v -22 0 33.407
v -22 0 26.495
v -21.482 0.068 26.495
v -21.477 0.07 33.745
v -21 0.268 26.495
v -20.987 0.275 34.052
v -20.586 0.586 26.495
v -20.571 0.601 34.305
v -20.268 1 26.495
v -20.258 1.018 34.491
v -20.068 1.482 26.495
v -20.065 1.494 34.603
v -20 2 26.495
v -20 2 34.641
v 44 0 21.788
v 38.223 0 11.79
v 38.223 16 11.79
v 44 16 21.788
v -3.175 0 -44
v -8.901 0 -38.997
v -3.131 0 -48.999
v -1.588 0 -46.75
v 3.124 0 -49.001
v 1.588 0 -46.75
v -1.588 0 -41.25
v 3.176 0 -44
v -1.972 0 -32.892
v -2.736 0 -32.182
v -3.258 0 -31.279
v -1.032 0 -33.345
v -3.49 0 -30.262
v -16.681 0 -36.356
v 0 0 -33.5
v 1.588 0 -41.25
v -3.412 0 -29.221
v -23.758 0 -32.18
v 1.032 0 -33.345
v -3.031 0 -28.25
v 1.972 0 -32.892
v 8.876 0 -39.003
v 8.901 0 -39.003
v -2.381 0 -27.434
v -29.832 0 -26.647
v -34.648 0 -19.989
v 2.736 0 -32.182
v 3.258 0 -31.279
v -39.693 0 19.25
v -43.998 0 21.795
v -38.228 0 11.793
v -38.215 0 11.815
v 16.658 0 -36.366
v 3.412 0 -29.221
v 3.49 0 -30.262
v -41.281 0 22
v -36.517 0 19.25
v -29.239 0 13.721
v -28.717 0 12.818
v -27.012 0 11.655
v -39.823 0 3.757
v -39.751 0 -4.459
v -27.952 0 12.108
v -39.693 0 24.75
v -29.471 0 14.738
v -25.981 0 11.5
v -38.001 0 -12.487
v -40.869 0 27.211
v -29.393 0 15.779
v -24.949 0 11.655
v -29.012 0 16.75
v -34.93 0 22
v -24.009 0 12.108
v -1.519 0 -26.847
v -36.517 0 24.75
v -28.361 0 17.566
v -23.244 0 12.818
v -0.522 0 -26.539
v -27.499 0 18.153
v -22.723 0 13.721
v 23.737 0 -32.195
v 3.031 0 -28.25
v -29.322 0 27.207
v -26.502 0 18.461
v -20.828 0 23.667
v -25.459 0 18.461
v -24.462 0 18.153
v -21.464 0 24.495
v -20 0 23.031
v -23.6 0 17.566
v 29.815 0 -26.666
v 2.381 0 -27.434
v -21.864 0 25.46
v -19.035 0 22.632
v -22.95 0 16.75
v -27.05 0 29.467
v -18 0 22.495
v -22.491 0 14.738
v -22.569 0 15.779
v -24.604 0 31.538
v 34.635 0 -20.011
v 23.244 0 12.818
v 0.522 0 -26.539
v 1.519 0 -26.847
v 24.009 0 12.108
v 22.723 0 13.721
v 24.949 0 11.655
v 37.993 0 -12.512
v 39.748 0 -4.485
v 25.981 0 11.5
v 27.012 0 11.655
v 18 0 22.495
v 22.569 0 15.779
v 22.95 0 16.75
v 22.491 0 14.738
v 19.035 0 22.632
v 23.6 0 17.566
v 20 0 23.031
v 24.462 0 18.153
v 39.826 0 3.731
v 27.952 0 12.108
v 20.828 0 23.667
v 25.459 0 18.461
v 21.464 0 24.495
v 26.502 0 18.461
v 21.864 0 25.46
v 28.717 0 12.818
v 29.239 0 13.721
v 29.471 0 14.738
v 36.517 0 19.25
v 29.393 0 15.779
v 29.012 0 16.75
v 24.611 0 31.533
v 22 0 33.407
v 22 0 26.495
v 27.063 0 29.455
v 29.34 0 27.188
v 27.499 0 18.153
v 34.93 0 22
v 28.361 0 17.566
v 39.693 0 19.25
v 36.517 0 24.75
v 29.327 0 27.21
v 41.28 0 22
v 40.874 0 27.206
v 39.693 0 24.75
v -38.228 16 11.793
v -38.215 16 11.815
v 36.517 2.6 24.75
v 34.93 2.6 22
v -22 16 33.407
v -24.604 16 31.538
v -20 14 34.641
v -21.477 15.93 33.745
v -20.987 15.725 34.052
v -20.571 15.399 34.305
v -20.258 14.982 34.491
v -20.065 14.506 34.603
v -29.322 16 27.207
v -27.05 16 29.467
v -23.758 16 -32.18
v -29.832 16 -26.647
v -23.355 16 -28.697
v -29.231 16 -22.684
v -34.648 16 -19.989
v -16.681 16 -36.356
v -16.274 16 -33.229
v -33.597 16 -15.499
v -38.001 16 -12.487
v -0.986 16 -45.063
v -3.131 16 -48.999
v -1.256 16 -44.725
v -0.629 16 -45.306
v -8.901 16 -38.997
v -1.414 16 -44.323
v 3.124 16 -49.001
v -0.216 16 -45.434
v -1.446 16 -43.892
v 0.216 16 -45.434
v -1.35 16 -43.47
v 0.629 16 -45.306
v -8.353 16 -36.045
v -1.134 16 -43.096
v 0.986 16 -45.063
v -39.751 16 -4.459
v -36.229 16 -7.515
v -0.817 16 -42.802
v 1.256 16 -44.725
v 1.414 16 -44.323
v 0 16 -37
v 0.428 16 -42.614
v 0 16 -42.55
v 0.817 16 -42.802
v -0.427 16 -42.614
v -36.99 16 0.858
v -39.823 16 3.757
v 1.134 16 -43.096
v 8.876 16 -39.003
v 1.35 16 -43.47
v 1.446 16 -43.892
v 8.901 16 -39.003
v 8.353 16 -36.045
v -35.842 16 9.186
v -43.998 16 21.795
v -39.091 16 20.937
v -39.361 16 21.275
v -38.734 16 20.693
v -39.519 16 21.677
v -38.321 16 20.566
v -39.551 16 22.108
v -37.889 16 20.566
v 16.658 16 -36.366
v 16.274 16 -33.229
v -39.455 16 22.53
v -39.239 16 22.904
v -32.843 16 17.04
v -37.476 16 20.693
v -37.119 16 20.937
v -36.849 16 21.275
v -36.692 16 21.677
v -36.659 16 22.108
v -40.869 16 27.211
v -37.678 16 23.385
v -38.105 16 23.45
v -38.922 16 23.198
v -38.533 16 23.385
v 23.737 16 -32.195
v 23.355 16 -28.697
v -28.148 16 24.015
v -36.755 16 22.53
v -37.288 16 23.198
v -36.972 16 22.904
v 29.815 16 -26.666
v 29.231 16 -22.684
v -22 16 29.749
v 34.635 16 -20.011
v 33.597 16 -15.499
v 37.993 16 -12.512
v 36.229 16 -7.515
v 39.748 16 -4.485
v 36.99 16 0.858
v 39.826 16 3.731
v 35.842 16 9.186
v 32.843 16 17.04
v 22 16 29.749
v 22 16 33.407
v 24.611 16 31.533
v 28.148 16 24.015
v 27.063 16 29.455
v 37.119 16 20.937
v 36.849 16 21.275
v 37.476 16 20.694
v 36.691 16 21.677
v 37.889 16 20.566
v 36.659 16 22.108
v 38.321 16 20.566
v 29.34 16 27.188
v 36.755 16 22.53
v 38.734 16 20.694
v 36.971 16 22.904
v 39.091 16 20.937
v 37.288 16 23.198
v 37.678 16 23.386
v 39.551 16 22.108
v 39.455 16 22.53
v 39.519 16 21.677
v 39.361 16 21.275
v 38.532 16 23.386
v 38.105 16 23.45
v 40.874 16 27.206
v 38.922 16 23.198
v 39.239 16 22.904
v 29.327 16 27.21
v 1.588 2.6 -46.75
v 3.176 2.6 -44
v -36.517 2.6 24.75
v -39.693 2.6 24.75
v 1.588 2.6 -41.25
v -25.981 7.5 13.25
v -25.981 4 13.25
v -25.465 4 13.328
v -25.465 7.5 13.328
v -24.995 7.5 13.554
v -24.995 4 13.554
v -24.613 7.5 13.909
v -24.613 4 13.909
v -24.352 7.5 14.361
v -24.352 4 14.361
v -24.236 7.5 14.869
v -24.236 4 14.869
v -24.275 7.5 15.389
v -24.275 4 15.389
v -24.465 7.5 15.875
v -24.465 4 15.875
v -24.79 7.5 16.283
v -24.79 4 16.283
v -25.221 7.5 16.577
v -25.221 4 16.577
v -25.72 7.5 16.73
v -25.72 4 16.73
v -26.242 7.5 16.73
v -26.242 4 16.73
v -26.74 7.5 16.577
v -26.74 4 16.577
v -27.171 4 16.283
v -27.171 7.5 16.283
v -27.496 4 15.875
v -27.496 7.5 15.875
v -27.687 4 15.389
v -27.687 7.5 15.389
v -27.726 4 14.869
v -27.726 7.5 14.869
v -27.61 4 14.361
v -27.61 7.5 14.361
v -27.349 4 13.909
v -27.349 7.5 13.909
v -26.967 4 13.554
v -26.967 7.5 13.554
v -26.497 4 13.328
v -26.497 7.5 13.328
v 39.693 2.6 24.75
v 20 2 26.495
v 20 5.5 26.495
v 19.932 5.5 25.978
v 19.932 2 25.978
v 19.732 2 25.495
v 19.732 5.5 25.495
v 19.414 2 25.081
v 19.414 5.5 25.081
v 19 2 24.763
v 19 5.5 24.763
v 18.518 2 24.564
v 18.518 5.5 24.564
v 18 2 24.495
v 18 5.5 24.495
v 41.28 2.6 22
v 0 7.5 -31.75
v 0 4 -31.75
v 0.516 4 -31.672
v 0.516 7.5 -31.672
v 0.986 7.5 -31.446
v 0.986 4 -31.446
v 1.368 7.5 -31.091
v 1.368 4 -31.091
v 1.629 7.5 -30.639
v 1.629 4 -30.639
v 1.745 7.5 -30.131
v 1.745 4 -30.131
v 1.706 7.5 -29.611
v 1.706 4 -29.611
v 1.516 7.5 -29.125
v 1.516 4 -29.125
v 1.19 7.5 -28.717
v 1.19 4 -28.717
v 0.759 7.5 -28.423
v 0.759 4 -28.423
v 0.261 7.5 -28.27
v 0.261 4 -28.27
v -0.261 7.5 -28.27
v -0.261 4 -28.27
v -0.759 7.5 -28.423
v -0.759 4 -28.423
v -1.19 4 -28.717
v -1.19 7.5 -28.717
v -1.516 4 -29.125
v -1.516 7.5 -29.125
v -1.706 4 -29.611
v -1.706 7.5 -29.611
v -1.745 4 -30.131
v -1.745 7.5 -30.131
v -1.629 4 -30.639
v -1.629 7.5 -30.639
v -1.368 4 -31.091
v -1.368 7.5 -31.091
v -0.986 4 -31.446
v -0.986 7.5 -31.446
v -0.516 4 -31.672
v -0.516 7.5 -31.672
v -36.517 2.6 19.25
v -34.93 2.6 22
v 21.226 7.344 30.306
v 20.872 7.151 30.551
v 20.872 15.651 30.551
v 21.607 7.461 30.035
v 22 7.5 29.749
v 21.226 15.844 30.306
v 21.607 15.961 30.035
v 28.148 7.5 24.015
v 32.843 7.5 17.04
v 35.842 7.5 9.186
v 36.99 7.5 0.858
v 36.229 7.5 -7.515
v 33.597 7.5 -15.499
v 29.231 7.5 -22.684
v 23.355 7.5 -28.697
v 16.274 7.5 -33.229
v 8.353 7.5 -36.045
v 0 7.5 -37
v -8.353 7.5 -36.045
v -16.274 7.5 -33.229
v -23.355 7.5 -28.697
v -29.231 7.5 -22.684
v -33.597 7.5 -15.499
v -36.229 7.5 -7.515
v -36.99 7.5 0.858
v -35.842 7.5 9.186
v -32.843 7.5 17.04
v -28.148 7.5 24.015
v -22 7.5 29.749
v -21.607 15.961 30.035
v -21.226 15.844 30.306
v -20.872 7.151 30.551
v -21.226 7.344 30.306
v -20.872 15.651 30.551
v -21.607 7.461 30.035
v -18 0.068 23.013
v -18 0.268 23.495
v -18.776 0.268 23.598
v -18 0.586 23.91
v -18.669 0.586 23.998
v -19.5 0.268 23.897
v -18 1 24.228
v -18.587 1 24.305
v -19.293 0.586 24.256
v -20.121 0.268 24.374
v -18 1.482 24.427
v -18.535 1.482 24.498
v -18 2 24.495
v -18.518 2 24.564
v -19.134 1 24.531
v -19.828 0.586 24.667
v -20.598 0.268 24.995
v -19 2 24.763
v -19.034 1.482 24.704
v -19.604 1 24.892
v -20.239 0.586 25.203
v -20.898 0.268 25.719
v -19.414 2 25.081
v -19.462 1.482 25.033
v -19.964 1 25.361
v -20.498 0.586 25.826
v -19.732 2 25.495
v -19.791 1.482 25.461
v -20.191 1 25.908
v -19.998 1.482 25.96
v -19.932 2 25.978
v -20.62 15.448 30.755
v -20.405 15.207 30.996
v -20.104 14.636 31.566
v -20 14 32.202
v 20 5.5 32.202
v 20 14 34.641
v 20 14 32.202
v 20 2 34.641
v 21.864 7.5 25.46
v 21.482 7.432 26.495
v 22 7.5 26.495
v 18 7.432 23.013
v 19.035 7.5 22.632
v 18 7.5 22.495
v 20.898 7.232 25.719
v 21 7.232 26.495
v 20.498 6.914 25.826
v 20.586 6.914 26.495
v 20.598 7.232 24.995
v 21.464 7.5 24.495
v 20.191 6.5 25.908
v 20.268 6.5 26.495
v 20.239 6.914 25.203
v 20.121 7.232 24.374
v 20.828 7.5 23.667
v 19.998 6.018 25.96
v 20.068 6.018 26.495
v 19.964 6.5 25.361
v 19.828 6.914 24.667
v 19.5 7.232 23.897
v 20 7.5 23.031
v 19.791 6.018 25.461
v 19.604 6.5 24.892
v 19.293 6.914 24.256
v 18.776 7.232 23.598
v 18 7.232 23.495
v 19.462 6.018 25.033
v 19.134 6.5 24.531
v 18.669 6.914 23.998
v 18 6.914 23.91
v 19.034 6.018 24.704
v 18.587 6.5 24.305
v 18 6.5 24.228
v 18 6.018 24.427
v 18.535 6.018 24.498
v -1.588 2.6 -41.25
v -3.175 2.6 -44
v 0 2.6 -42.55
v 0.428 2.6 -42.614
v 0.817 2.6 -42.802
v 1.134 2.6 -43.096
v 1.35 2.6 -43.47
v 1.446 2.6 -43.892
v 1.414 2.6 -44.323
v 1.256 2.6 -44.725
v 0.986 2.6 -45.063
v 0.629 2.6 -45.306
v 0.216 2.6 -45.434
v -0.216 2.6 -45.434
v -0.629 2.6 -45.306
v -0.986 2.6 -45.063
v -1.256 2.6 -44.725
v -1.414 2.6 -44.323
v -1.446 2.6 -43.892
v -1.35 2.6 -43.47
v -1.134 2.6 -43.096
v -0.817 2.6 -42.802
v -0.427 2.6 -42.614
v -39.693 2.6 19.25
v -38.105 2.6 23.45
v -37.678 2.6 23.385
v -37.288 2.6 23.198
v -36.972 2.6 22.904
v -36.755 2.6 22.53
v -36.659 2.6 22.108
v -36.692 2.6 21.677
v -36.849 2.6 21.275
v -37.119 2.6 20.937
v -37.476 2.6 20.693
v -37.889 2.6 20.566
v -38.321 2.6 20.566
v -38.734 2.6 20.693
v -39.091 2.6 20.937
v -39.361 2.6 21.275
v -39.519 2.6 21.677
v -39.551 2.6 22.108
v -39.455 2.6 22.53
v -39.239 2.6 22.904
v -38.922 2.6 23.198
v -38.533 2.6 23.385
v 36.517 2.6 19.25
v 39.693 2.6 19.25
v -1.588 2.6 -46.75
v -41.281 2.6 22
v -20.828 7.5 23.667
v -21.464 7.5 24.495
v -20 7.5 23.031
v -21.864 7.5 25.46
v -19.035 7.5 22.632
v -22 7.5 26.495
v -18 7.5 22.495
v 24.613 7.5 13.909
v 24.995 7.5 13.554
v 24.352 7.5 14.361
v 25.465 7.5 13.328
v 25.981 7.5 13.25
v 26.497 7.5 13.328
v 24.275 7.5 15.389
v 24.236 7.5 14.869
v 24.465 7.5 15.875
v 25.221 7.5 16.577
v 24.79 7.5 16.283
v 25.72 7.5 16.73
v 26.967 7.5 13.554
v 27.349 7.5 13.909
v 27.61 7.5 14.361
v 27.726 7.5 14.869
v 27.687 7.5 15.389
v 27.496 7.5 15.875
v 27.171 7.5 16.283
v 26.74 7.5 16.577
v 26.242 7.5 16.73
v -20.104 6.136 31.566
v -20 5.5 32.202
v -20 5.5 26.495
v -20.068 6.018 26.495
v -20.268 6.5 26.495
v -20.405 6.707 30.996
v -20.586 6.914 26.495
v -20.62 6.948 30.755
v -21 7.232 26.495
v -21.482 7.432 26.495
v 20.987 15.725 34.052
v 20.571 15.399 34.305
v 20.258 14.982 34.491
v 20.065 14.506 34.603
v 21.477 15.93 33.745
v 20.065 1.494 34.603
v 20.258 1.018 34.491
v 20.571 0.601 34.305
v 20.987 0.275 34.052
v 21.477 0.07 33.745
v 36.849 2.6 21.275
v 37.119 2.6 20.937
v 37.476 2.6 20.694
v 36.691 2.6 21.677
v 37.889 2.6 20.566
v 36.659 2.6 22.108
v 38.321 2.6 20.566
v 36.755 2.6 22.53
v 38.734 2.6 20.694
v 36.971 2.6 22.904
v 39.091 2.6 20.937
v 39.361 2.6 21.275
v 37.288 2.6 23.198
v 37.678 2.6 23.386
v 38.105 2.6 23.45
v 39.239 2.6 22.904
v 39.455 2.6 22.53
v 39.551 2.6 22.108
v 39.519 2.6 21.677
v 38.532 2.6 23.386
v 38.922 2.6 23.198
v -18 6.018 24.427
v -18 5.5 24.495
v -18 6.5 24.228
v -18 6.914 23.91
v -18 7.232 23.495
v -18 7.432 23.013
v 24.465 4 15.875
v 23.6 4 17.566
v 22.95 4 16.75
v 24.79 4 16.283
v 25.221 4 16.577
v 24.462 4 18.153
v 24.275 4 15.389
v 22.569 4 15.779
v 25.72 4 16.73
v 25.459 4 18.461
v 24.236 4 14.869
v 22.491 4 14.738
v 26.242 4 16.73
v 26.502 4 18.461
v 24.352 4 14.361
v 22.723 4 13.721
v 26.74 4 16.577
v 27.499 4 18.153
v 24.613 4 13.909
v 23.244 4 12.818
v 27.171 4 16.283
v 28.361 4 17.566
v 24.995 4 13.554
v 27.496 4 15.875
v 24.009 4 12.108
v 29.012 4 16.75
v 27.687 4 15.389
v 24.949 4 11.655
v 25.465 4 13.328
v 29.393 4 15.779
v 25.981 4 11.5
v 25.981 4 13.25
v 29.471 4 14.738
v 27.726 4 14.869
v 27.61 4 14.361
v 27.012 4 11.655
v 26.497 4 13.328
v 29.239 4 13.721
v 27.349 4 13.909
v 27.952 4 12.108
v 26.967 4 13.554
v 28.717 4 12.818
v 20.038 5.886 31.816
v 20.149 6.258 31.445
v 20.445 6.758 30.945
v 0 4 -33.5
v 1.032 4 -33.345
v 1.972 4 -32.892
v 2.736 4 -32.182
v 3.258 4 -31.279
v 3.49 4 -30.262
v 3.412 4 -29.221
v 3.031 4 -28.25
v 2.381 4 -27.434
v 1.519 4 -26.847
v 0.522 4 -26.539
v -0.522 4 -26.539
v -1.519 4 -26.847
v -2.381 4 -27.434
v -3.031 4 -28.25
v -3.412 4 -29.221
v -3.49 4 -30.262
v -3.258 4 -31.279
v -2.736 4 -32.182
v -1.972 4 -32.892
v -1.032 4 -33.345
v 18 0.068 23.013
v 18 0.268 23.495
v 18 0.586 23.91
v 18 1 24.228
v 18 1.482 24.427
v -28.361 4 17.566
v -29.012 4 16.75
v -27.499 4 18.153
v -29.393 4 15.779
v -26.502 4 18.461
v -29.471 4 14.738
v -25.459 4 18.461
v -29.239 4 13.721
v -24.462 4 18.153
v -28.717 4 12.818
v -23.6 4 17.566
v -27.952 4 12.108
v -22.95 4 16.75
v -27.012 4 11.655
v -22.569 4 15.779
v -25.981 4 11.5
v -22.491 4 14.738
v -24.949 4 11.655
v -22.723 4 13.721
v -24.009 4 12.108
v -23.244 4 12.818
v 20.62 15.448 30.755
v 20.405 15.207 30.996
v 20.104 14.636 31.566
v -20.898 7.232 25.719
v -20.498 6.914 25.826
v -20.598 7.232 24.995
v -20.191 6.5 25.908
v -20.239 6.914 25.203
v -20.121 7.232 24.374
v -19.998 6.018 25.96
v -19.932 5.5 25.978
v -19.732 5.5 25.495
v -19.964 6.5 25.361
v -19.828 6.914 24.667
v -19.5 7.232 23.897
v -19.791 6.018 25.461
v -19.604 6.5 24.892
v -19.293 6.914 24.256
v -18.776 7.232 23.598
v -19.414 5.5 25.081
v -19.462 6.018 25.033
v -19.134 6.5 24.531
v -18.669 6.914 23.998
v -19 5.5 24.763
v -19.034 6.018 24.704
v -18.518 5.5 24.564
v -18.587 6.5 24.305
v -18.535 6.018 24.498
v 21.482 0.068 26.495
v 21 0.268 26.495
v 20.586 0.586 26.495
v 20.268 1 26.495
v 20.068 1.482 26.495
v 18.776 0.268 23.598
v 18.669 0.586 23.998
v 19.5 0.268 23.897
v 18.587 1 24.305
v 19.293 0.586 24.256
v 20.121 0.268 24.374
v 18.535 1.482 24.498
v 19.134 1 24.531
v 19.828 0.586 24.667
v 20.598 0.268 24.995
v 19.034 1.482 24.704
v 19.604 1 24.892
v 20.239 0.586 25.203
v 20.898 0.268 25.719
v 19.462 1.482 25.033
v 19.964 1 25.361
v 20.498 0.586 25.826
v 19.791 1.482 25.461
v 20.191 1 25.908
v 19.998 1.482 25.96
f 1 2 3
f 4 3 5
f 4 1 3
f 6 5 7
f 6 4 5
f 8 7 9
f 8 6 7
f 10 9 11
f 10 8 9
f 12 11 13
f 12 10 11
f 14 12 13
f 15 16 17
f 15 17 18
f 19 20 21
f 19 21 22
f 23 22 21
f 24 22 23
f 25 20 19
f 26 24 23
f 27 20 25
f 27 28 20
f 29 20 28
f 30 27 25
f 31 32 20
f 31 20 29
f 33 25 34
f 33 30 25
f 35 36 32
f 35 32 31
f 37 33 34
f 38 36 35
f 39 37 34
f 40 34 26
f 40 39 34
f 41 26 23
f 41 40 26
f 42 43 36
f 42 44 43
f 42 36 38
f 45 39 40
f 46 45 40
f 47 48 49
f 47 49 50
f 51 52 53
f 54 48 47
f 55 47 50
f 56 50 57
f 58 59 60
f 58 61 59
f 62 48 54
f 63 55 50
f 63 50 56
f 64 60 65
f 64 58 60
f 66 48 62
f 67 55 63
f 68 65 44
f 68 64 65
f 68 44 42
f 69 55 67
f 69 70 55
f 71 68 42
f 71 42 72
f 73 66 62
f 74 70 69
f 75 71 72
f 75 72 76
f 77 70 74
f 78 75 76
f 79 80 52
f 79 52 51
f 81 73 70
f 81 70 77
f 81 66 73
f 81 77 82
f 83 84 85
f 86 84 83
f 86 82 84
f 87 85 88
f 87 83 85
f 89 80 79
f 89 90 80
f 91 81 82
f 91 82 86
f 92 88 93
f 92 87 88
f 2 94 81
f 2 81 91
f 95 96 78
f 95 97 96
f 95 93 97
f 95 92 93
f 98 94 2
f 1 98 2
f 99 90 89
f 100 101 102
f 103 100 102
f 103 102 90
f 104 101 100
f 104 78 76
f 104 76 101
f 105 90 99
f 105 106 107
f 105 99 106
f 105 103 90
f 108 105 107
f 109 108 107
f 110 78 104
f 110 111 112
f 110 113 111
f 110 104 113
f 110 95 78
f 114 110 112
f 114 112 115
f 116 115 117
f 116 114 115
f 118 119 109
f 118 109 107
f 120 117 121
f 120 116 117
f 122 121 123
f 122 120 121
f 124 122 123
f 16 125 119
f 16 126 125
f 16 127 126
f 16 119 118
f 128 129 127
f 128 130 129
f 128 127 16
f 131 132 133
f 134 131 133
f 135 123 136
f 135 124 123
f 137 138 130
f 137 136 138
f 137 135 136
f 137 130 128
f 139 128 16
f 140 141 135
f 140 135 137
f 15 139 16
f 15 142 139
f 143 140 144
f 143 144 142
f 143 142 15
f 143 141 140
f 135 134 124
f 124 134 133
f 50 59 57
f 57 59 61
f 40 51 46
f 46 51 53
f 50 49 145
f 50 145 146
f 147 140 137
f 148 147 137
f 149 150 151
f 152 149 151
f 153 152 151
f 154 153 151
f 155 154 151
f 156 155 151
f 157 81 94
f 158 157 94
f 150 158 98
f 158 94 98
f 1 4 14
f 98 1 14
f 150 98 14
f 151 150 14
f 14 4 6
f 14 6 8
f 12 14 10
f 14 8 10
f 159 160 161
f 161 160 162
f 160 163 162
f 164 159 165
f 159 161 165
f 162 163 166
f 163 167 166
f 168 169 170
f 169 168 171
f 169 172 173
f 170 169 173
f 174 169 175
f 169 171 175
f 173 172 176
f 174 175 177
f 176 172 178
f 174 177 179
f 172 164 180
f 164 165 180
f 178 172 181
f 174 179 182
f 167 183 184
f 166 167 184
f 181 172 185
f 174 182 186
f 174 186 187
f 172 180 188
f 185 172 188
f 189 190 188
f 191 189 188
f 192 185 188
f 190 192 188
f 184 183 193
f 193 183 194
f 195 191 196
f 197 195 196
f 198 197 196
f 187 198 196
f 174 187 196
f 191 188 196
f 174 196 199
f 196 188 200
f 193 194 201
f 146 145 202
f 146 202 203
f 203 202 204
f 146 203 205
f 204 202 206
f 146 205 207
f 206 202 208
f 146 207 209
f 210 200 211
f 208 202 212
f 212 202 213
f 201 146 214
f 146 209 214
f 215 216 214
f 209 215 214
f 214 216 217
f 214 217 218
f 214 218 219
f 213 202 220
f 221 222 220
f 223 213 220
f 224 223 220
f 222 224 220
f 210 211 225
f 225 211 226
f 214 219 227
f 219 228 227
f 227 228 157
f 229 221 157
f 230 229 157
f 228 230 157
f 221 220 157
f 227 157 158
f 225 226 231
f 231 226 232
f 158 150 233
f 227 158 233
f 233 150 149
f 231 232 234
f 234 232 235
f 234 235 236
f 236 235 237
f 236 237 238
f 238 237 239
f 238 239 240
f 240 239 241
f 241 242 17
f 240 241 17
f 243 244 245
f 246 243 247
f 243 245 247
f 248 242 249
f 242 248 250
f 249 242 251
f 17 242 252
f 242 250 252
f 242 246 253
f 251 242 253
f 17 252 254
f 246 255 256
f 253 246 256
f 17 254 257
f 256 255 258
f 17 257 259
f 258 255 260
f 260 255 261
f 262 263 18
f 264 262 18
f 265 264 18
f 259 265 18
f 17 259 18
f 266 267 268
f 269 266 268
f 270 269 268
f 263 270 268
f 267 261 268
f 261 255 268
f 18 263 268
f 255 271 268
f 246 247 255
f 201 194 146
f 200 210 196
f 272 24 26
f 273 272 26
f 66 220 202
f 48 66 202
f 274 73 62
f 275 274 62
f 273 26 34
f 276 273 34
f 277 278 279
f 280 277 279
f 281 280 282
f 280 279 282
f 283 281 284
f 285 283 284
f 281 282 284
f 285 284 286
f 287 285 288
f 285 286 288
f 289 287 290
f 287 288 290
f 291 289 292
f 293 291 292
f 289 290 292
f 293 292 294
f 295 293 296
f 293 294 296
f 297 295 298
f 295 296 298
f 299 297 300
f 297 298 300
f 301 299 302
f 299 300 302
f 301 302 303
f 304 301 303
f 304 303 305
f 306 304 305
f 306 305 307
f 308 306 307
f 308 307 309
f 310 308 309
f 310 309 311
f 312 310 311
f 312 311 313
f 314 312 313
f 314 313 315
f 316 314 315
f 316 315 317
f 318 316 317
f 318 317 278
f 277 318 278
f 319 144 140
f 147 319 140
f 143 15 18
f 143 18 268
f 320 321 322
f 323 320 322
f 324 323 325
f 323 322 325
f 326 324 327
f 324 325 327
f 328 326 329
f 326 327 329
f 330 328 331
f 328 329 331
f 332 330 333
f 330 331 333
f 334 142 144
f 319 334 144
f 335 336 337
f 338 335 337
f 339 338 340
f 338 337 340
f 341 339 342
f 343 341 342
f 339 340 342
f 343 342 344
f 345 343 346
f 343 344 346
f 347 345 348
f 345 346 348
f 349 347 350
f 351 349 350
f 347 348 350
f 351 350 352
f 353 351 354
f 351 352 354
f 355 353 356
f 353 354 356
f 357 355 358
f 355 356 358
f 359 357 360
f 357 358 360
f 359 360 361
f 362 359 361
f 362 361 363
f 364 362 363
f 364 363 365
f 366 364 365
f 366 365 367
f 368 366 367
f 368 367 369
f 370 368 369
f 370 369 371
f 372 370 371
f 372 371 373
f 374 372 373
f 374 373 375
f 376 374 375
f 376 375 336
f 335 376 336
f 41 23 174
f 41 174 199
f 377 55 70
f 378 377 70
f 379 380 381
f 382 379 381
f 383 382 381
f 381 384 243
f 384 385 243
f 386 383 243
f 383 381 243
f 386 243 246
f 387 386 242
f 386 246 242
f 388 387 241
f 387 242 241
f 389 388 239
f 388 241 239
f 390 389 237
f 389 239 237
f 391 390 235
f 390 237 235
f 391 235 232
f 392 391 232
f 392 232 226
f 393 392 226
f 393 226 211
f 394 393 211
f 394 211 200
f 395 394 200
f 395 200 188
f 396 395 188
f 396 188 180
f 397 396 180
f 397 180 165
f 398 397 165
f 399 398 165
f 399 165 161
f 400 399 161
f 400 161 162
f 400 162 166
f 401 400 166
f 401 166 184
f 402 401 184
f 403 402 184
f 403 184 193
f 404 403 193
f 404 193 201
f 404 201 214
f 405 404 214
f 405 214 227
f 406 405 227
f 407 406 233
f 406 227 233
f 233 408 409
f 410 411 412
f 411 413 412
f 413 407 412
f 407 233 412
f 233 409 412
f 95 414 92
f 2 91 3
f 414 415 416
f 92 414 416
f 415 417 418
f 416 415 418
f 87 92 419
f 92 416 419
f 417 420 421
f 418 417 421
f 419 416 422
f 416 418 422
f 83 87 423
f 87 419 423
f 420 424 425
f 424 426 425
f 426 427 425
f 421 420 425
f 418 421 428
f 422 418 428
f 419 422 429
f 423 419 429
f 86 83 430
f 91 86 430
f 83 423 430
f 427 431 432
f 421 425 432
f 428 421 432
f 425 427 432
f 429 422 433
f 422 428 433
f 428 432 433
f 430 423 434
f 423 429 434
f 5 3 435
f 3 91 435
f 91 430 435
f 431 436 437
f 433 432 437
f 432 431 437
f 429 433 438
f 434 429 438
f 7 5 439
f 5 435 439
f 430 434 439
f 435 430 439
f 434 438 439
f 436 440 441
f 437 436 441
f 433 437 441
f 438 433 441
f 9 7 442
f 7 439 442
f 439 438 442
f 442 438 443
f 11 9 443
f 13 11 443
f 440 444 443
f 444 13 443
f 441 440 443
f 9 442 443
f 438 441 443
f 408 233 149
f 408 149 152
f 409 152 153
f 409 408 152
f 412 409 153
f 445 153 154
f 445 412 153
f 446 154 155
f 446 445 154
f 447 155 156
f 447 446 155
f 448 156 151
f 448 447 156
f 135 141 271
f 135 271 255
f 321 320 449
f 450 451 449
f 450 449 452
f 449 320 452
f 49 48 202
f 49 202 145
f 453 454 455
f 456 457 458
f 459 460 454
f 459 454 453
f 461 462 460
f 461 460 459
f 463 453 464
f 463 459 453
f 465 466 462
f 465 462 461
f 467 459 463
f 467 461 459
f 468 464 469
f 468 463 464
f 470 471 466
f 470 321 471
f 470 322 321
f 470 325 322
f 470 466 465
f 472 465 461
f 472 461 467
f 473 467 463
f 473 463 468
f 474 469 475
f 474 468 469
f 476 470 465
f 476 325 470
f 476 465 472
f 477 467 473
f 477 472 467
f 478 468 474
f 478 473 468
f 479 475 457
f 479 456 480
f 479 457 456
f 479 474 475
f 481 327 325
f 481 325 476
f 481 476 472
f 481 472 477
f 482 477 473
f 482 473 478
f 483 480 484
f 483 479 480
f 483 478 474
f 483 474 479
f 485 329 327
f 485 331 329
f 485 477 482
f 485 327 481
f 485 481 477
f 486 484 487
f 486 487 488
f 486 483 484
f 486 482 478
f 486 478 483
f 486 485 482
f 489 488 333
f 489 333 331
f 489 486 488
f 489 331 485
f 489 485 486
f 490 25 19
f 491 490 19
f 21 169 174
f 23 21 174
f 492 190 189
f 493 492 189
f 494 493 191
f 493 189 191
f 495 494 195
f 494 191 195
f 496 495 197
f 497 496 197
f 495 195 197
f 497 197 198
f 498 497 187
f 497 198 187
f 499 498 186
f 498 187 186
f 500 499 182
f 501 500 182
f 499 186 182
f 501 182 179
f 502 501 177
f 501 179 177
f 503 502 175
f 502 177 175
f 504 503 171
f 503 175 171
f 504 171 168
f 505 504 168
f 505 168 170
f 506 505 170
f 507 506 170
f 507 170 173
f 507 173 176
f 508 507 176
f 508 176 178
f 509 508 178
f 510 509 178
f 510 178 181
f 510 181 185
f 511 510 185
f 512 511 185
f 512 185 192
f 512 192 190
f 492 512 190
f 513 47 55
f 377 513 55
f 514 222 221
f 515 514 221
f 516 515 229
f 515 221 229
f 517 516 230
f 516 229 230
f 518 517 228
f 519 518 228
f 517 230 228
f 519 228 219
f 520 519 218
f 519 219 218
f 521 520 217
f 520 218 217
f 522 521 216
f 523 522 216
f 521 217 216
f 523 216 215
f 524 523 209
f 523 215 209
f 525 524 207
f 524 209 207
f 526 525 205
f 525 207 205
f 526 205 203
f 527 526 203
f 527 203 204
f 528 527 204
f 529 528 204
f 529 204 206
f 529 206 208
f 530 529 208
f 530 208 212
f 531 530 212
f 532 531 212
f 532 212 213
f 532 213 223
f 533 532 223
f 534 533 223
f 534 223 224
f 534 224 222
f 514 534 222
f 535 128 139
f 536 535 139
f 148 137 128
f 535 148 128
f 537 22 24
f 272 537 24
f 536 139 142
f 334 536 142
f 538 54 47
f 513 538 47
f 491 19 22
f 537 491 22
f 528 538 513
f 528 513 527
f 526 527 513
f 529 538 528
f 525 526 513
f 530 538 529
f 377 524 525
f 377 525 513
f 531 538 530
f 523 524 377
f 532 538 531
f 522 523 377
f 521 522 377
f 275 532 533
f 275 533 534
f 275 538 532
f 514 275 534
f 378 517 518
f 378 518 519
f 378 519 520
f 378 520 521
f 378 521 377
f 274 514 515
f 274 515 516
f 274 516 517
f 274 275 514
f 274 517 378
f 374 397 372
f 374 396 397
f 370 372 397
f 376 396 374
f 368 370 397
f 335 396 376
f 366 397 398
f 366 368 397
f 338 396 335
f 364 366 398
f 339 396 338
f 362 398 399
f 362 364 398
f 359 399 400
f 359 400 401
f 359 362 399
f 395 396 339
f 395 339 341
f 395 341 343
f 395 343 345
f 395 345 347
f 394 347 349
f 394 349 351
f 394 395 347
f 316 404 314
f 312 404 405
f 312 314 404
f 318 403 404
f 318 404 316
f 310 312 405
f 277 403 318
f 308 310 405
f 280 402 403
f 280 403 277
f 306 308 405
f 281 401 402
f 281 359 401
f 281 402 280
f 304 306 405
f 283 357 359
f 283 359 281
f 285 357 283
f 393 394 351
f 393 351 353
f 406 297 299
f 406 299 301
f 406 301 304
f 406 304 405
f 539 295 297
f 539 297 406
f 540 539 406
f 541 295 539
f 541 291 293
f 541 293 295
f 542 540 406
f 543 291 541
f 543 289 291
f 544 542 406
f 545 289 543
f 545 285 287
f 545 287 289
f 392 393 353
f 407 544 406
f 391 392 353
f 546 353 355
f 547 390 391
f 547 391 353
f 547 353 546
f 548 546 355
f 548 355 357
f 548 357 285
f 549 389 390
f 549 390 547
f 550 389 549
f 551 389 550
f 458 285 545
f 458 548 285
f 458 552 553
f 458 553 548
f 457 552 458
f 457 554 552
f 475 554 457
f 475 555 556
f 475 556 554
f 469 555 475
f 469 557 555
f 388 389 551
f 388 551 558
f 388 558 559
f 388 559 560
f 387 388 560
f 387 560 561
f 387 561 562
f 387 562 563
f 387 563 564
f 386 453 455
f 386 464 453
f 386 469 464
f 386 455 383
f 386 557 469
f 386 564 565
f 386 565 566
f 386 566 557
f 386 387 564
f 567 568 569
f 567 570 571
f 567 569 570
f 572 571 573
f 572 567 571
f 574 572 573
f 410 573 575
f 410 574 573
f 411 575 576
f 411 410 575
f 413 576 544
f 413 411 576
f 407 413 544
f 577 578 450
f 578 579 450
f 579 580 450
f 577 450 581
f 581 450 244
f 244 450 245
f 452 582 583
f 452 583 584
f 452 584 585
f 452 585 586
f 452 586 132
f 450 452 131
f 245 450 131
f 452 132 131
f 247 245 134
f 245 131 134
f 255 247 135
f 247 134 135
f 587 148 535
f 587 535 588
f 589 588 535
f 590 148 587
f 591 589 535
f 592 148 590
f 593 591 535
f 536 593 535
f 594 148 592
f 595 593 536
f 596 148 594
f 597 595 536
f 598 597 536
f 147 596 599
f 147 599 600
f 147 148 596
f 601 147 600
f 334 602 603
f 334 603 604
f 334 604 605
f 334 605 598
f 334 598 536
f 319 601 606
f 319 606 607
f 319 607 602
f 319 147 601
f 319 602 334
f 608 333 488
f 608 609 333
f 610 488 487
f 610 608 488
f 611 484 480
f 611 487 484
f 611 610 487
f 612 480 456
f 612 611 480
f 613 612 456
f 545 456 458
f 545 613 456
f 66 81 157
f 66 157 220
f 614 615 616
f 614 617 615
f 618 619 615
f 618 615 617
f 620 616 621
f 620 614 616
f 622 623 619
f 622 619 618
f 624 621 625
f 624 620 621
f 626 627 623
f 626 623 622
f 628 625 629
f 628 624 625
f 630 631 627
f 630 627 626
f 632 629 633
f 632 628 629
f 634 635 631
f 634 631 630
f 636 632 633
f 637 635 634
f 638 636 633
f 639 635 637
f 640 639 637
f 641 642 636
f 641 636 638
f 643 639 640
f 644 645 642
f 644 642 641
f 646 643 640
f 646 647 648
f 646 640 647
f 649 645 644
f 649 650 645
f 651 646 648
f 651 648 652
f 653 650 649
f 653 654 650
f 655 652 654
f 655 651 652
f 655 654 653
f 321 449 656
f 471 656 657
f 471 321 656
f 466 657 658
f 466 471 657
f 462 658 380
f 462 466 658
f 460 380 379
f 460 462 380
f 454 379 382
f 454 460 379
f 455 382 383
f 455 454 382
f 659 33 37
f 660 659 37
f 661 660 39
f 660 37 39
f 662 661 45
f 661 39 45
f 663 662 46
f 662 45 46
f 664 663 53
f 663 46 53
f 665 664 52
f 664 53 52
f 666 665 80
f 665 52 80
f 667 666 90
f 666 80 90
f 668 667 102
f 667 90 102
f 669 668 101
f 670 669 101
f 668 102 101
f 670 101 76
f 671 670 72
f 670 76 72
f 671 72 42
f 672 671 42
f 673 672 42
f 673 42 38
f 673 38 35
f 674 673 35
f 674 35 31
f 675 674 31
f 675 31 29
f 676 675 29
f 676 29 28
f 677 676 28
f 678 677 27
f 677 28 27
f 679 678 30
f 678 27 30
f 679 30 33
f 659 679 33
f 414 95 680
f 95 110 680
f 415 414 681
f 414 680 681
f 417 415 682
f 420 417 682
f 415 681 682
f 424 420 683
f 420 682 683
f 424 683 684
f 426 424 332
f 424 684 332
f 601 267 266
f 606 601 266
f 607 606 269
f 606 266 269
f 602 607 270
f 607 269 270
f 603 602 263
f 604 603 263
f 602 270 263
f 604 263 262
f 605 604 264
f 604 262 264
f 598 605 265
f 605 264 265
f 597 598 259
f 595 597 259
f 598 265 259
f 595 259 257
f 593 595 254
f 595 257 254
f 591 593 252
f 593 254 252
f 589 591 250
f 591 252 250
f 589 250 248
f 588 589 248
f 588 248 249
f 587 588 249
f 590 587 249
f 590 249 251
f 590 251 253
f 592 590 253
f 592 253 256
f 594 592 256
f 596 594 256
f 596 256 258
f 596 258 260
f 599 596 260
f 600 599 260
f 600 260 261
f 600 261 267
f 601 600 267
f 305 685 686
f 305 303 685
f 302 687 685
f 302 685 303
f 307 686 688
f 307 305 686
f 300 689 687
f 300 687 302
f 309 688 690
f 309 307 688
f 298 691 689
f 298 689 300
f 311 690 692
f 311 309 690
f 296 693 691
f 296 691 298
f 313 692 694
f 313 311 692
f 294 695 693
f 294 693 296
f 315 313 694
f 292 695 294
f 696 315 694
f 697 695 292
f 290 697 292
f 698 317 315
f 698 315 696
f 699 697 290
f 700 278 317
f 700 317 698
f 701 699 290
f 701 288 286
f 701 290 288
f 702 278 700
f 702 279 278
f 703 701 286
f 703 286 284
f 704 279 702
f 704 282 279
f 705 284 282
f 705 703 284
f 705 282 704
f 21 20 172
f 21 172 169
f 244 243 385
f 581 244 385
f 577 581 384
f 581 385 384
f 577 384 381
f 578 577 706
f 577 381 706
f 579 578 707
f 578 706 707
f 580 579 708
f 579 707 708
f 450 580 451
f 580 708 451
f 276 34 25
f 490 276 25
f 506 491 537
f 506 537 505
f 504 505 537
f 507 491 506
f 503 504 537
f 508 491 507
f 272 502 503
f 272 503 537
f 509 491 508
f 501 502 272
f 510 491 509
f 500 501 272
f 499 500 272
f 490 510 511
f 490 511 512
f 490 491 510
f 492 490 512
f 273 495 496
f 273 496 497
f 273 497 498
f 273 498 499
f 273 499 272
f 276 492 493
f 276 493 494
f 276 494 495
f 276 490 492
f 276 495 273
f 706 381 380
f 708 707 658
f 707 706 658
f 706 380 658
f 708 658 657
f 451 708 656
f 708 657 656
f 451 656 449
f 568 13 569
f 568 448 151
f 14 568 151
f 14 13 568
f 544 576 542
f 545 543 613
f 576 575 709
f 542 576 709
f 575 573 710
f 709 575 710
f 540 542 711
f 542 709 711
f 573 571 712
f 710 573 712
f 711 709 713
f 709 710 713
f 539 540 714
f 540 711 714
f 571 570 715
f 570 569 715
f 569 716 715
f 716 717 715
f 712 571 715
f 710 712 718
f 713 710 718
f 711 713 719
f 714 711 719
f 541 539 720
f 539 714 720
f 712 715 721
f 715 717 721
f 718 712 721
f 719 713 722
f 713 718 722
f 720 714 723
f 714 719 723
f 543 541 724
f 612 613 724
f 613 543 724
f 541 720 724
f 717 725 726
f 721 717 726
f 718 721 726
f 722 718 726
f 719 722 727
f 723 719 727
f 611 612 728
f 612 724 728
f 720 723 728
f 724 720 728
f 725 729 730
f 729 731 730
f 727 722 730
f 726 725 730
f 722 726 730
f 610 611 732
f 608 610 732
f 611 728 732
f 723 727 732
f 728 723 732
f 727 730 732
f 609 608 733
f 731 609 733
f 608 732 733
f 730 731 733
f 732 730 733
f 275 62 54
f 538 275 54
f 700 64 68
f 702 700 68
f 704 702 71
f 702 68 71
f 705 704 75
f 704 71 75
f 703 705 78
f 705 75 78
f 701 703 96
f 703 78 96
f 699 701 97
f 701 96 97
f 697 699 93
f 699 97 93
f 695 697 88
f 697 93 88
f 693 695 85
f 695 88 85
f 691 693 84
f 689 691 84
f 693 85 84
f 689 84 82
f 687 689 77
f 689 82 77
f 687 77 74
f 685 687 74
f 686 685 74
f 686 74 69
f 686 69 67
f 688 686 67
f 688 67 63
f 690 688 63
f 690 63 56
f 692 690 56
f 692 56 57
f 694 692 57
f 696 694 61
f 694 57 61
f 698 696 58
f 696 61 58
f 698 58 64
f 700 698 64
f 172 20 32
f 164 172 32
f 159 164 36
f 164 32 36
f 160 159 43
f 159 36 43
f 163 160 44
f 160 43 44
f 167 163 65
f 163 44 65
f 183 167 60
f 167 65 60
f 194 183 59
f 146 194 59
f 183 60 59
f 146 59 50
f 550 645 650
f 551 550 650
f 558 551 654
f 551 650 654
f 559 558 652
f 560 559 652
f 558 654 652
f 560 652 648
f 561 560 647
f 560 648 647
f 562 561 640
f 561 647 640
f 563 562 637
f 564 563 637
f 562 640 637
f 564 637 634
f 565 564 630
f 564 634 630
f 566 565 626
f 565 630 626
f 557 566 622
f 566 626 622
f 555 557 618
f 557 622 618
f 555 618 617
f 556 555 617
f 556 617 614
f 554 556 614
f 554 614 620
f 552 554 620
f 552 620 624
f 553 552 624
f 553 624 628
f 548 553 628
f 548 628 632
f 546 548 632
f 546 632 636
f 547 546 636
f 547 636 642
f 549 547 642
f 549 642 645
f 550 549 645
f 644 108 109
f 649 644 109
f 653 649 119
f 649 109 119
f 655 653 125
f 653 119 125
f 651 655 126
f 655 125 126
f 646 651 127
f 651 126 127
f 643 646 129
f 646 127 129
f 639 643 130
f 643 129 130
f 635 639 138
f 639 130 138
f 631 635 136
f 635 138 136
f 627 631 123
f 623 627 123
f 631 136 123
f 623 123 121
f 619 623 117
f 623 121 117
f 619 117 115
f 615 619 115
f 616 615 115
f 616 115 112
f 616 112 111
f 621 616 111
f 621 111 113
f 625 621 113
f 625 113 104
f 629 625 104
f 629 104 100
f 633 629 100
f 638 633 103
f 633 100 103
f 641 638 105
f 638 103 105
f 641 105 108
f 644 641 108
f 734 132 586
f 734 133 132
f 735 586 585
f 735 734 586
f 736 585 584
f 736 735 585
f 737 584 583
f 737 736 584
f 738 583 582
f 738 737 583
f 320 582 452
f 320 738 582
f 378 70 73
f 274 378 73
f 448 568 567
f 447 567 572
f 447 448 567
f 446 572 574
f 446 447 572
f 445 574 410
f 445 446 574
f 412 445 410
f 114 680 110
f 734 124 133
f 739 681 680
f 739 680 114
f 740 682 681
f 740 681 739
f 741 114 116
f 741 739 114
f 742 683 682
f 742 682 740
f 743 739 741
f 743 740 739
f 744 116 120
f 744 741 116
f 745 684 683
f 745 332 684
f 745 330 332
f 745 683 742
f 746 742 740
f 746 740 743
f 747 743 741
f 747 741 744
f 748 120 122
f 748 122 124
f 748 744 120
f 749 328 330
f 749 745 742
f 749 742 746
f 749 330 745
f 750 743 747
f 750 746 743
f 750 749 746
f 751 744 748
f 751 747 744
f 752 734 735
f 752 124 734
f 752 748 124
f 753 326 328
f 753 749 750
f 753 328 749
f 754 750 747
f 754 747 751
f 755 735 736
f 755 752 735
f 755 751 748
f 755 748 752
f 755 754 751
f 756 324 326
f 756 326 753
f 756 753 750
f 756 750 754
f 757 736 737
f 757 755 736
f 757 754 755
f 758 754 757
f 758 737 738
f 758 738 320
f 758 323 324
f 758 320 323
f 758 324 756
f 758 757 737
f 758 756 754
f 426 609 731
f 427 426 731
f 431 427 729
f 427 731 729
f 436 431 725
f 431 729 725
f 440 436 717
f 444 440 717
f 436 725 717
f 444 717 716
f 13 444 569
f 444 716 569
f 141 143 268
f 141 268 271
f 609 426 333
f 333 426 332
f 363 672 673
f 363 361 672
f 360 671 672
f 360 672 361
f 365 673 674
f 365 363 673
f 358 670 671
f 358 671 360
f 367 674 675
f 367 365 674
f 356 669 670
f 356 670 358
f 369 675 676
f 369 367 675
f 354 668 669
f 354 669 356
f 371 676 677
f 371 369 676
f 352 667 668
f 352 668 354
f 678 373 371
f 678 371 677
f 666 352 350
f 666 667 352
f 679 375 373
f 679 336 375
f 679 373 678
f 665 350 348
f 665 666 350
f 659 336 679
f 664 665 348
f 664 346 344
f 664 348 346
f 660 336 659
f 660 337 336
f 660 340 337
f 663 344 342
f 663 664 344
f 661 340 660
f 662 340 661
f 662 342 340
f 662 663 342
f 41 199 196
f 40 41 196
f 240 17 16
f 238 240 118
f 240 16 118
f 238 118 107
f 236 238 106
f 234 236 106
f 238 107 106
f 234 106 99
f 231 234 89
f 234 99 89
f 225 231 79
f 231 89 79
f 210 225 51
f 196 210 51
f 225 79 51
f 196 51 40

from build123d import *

# Parameters (mm, degrees)
SKETCH_1_R          = 40
EXTRUDE_1_DEPTH     = 16
SKETCH_2_R          = 37
CUT_EXTRUDE_1_DEPTH = 8.5
SKETCH_3_W          = 40
SKETCH_3_H          = 14.857277492
CUT_EXTRUDE_2_DEPTH = 59.787753827
SKETCH_4_W          = 40
SKETCH_4_H          = 3
CUT_EXTRUDE_3_DEPTH = 59.787753827
SKETCH_5_R          = 1.75
CUT_EXTRUDE_4_DEPTH = 59.787753827
EXTRUDE_2_DEPTH     = 16
SKETCH_10_R         = 1.45
CUT_EXTRUDE_5_DEPTH = 68.772200298
CUT_EXTRUDE_6_DEPTH = 2.6
SKETCH_13_R         = 3.5
CUT_EXTRUDE_7_DEPTH = 4
FILLET_2_R          = 2
FILLET_3_R          = 2


with BuildPart() as part:
    # 草图1 → 凸台-拉伸1 (new body)
    with BuildSketch(Plane(origin=(0, 0, 0), x_dir=(1, 0, 0), z_dir=(0, 1, 0))):
        with Locations(Location((0, 0, 0), (0, 0, 270))):
            Circle(SKETCH_1_R)
    extrude(amount=EXTRUDE_1_DEPTH)

    # 草图2 → 切除-拉伸1 (cut)
    with BuildSketch(Plane(origin=(0, 16, 0), x_dir=(1, 0, 0), z_dir=(0, 1, 0))):
        with Locations(Location((0, 0, 0), (0, 0, 270))):
            Circle(SKETCH_2_R)
    extrude(amount=-CUT_EXTRUDE_1_DEPTH, mode=Mode.SUBTRACT)

    # 草图3 → 切除-拉伸2 (cut, through all)
    with BuildSketch(Plane.XZ):
        with Locations((0, 34.924092916)):
            Rectangle(SKETCH_3_W, SKETCH_3_H)
    extrude(amount=-CUT_EXTRUDE_2_DEPTH, mode=Mode.SUBTRACT)

    # 草图4 → 切除-拉伸3 (cut, through all)
    with BuildSketch(Plane.XZ):
        with Locations((0, 25.99545417)):
            Rectangle(SKETCH_4_W, SKETCH_4_H)
    extrude(amount=-CUT_EXTRUDE_3_DEPTH, mode=Mode.SUBTRACT)

    # 草图5 → 切除-拉伸4 (cut, through all)
    with BuildSketch(Plane.XZ):
        with Locations(Location((0, -30, 0), (0, 0, 270))):
            Circle(SKETCH_5_R)
        with Locations(Location((-25.980762114, 15, 0), (0, 0, 270))):
            Circle(SKETCH_5_R)
        with Locations(Location((25.980762114, 15, 0), (0, 0, 270))):
            Circle(SKETCH_5_R)
    extrude(amount=-CUT_EXTRUDE_4_DEPTH, mode=Mode.SUBTRACT)

    # 草图6 → 凸台-拉伸2 (add)
    with BuildSketch(Plane.XZ):
        Polygon((29.32705693, 27.20983301), (38.222924566, 11.79016699), (43.999676996, 21.788290048), (40.874061704, 27.206080183), align=None)
        Polygon((8.900878155, -39.002892824), (-8.900878155, -38.997107176), (-3.130625811, -48.998983061), (3.124125724, -49.001015883), align=None)
        Polygon((-38.227935084, 11.793059814), (-29.322046411, 27.206940186), (-40.869051185, 27.210693013), (-43.998187428, 21.7949357), align=None)
    extrude(amount=-EXTRUDE_2_DEPTH)

    # 草图10 → 切除-拉伸5 (cut, through all)
    with BuildSketch(Plane(origin=(0, 16, 0), x_dir=(1, 0, 0), z_dir=(0, 1, 0))):
        with Locations(Location((0.000113428, 44.000000301, 0), (0, 0, 270))):
            Circle(SKETCH_10_R)
        with Locations(Location((38.105061313, -22.000098382, 0), (0, 0, 270))):
            Circle(SKETCH_10_R)
        with Locations(Location((-38.105174741, -21.999901919, 0), (0, 0, 270))):
            Circle(SKETCH_10_R)
    extrude(amount=-CUT_EXTRUDE_5_DEPTH, mode=Mode.SUBTRACT)

    # 草图11 → 切除-拉伸6 (cut)
    with BuildSketch(Plane.XZ):
        Polygon((-39.692887981, 19.249901919), (-36.517461501, 19.249901919), (-34.929748261, 21.999901919), (-36.517461501, 24.749901919), (-39.692887981, 24.749901919), (-41.280601222, 21.999901919), align=None)
        Polygon((3.175539908, -44.000000301), (1.587826668, -41.250000301), (-1.587599812, -41.250000301), (-3.175313053, -44.000000301), (-1.587599812, -46.750000301), (1.587826668, -46.750000301), align=None)
        Polygon((36.517348073, 24.750098382), (34.929634833, 22.000098382), (36.517348073, 19.250098382), (39.692774553, 19.250098382), (41.280487794, 22.000098382), (39.692774553, 24.750098382), align=None)
    extrude(amount=-CUT_EXTRUDE_6_DEPTH, mode=Mode.SUBTRACT)

    # 草图13 → 切除-拉伸7 (cut)
    with BuildSketch(Plane.XZ):
        with Locations(Location((-25.980762114, 15, 0), (0, 0, 270))):
            Circle(SKETCH_13_R)
        with Locations(Location((25.980762114, 15, 0), (0, 0, 270))):
            Circle(SKETCH_13_R)
        with Locations(Location((0, -30, 0), (0, 0, 270))):
            Circle(SKETCH_13_R)
    extrude(amount=-CUT_EXTRUDE_7_DEPTH, mode=Mode.SUBTRACT)

    # 圆角2
    fillet_2_edges = [part.edges().sort_by_distance(p)[0] for p in [
        (20, 7.5, 27.812109501),
        (-20, 7.5, 27.812109501),
        (-20, 0, 29.568235161),
        (20, 0, 29.568235161),
        (0, 7.5, 24.49545417),
        (-20, 3.75, 24.49545417),
        (20, 3.75, 24.49545417),
        (0, 0, 24.49545417),
    ]]
    fillet(fillet_2_edges, radius=FILLET_2_R)

    # 圆角3
    fillet_3_edges = [part.edges().sort_by_distance(p)[0] for p in [
        (-20, 16, 32.884890492),
        (-20, 10.75, 31.128764833),
        (20, 10.75, 31.128764833),
        (20, 16, 32.884890492),
    ]]
    fillet(fillet_3_edges, radius=FILLET_3_R)


solid = part.part
